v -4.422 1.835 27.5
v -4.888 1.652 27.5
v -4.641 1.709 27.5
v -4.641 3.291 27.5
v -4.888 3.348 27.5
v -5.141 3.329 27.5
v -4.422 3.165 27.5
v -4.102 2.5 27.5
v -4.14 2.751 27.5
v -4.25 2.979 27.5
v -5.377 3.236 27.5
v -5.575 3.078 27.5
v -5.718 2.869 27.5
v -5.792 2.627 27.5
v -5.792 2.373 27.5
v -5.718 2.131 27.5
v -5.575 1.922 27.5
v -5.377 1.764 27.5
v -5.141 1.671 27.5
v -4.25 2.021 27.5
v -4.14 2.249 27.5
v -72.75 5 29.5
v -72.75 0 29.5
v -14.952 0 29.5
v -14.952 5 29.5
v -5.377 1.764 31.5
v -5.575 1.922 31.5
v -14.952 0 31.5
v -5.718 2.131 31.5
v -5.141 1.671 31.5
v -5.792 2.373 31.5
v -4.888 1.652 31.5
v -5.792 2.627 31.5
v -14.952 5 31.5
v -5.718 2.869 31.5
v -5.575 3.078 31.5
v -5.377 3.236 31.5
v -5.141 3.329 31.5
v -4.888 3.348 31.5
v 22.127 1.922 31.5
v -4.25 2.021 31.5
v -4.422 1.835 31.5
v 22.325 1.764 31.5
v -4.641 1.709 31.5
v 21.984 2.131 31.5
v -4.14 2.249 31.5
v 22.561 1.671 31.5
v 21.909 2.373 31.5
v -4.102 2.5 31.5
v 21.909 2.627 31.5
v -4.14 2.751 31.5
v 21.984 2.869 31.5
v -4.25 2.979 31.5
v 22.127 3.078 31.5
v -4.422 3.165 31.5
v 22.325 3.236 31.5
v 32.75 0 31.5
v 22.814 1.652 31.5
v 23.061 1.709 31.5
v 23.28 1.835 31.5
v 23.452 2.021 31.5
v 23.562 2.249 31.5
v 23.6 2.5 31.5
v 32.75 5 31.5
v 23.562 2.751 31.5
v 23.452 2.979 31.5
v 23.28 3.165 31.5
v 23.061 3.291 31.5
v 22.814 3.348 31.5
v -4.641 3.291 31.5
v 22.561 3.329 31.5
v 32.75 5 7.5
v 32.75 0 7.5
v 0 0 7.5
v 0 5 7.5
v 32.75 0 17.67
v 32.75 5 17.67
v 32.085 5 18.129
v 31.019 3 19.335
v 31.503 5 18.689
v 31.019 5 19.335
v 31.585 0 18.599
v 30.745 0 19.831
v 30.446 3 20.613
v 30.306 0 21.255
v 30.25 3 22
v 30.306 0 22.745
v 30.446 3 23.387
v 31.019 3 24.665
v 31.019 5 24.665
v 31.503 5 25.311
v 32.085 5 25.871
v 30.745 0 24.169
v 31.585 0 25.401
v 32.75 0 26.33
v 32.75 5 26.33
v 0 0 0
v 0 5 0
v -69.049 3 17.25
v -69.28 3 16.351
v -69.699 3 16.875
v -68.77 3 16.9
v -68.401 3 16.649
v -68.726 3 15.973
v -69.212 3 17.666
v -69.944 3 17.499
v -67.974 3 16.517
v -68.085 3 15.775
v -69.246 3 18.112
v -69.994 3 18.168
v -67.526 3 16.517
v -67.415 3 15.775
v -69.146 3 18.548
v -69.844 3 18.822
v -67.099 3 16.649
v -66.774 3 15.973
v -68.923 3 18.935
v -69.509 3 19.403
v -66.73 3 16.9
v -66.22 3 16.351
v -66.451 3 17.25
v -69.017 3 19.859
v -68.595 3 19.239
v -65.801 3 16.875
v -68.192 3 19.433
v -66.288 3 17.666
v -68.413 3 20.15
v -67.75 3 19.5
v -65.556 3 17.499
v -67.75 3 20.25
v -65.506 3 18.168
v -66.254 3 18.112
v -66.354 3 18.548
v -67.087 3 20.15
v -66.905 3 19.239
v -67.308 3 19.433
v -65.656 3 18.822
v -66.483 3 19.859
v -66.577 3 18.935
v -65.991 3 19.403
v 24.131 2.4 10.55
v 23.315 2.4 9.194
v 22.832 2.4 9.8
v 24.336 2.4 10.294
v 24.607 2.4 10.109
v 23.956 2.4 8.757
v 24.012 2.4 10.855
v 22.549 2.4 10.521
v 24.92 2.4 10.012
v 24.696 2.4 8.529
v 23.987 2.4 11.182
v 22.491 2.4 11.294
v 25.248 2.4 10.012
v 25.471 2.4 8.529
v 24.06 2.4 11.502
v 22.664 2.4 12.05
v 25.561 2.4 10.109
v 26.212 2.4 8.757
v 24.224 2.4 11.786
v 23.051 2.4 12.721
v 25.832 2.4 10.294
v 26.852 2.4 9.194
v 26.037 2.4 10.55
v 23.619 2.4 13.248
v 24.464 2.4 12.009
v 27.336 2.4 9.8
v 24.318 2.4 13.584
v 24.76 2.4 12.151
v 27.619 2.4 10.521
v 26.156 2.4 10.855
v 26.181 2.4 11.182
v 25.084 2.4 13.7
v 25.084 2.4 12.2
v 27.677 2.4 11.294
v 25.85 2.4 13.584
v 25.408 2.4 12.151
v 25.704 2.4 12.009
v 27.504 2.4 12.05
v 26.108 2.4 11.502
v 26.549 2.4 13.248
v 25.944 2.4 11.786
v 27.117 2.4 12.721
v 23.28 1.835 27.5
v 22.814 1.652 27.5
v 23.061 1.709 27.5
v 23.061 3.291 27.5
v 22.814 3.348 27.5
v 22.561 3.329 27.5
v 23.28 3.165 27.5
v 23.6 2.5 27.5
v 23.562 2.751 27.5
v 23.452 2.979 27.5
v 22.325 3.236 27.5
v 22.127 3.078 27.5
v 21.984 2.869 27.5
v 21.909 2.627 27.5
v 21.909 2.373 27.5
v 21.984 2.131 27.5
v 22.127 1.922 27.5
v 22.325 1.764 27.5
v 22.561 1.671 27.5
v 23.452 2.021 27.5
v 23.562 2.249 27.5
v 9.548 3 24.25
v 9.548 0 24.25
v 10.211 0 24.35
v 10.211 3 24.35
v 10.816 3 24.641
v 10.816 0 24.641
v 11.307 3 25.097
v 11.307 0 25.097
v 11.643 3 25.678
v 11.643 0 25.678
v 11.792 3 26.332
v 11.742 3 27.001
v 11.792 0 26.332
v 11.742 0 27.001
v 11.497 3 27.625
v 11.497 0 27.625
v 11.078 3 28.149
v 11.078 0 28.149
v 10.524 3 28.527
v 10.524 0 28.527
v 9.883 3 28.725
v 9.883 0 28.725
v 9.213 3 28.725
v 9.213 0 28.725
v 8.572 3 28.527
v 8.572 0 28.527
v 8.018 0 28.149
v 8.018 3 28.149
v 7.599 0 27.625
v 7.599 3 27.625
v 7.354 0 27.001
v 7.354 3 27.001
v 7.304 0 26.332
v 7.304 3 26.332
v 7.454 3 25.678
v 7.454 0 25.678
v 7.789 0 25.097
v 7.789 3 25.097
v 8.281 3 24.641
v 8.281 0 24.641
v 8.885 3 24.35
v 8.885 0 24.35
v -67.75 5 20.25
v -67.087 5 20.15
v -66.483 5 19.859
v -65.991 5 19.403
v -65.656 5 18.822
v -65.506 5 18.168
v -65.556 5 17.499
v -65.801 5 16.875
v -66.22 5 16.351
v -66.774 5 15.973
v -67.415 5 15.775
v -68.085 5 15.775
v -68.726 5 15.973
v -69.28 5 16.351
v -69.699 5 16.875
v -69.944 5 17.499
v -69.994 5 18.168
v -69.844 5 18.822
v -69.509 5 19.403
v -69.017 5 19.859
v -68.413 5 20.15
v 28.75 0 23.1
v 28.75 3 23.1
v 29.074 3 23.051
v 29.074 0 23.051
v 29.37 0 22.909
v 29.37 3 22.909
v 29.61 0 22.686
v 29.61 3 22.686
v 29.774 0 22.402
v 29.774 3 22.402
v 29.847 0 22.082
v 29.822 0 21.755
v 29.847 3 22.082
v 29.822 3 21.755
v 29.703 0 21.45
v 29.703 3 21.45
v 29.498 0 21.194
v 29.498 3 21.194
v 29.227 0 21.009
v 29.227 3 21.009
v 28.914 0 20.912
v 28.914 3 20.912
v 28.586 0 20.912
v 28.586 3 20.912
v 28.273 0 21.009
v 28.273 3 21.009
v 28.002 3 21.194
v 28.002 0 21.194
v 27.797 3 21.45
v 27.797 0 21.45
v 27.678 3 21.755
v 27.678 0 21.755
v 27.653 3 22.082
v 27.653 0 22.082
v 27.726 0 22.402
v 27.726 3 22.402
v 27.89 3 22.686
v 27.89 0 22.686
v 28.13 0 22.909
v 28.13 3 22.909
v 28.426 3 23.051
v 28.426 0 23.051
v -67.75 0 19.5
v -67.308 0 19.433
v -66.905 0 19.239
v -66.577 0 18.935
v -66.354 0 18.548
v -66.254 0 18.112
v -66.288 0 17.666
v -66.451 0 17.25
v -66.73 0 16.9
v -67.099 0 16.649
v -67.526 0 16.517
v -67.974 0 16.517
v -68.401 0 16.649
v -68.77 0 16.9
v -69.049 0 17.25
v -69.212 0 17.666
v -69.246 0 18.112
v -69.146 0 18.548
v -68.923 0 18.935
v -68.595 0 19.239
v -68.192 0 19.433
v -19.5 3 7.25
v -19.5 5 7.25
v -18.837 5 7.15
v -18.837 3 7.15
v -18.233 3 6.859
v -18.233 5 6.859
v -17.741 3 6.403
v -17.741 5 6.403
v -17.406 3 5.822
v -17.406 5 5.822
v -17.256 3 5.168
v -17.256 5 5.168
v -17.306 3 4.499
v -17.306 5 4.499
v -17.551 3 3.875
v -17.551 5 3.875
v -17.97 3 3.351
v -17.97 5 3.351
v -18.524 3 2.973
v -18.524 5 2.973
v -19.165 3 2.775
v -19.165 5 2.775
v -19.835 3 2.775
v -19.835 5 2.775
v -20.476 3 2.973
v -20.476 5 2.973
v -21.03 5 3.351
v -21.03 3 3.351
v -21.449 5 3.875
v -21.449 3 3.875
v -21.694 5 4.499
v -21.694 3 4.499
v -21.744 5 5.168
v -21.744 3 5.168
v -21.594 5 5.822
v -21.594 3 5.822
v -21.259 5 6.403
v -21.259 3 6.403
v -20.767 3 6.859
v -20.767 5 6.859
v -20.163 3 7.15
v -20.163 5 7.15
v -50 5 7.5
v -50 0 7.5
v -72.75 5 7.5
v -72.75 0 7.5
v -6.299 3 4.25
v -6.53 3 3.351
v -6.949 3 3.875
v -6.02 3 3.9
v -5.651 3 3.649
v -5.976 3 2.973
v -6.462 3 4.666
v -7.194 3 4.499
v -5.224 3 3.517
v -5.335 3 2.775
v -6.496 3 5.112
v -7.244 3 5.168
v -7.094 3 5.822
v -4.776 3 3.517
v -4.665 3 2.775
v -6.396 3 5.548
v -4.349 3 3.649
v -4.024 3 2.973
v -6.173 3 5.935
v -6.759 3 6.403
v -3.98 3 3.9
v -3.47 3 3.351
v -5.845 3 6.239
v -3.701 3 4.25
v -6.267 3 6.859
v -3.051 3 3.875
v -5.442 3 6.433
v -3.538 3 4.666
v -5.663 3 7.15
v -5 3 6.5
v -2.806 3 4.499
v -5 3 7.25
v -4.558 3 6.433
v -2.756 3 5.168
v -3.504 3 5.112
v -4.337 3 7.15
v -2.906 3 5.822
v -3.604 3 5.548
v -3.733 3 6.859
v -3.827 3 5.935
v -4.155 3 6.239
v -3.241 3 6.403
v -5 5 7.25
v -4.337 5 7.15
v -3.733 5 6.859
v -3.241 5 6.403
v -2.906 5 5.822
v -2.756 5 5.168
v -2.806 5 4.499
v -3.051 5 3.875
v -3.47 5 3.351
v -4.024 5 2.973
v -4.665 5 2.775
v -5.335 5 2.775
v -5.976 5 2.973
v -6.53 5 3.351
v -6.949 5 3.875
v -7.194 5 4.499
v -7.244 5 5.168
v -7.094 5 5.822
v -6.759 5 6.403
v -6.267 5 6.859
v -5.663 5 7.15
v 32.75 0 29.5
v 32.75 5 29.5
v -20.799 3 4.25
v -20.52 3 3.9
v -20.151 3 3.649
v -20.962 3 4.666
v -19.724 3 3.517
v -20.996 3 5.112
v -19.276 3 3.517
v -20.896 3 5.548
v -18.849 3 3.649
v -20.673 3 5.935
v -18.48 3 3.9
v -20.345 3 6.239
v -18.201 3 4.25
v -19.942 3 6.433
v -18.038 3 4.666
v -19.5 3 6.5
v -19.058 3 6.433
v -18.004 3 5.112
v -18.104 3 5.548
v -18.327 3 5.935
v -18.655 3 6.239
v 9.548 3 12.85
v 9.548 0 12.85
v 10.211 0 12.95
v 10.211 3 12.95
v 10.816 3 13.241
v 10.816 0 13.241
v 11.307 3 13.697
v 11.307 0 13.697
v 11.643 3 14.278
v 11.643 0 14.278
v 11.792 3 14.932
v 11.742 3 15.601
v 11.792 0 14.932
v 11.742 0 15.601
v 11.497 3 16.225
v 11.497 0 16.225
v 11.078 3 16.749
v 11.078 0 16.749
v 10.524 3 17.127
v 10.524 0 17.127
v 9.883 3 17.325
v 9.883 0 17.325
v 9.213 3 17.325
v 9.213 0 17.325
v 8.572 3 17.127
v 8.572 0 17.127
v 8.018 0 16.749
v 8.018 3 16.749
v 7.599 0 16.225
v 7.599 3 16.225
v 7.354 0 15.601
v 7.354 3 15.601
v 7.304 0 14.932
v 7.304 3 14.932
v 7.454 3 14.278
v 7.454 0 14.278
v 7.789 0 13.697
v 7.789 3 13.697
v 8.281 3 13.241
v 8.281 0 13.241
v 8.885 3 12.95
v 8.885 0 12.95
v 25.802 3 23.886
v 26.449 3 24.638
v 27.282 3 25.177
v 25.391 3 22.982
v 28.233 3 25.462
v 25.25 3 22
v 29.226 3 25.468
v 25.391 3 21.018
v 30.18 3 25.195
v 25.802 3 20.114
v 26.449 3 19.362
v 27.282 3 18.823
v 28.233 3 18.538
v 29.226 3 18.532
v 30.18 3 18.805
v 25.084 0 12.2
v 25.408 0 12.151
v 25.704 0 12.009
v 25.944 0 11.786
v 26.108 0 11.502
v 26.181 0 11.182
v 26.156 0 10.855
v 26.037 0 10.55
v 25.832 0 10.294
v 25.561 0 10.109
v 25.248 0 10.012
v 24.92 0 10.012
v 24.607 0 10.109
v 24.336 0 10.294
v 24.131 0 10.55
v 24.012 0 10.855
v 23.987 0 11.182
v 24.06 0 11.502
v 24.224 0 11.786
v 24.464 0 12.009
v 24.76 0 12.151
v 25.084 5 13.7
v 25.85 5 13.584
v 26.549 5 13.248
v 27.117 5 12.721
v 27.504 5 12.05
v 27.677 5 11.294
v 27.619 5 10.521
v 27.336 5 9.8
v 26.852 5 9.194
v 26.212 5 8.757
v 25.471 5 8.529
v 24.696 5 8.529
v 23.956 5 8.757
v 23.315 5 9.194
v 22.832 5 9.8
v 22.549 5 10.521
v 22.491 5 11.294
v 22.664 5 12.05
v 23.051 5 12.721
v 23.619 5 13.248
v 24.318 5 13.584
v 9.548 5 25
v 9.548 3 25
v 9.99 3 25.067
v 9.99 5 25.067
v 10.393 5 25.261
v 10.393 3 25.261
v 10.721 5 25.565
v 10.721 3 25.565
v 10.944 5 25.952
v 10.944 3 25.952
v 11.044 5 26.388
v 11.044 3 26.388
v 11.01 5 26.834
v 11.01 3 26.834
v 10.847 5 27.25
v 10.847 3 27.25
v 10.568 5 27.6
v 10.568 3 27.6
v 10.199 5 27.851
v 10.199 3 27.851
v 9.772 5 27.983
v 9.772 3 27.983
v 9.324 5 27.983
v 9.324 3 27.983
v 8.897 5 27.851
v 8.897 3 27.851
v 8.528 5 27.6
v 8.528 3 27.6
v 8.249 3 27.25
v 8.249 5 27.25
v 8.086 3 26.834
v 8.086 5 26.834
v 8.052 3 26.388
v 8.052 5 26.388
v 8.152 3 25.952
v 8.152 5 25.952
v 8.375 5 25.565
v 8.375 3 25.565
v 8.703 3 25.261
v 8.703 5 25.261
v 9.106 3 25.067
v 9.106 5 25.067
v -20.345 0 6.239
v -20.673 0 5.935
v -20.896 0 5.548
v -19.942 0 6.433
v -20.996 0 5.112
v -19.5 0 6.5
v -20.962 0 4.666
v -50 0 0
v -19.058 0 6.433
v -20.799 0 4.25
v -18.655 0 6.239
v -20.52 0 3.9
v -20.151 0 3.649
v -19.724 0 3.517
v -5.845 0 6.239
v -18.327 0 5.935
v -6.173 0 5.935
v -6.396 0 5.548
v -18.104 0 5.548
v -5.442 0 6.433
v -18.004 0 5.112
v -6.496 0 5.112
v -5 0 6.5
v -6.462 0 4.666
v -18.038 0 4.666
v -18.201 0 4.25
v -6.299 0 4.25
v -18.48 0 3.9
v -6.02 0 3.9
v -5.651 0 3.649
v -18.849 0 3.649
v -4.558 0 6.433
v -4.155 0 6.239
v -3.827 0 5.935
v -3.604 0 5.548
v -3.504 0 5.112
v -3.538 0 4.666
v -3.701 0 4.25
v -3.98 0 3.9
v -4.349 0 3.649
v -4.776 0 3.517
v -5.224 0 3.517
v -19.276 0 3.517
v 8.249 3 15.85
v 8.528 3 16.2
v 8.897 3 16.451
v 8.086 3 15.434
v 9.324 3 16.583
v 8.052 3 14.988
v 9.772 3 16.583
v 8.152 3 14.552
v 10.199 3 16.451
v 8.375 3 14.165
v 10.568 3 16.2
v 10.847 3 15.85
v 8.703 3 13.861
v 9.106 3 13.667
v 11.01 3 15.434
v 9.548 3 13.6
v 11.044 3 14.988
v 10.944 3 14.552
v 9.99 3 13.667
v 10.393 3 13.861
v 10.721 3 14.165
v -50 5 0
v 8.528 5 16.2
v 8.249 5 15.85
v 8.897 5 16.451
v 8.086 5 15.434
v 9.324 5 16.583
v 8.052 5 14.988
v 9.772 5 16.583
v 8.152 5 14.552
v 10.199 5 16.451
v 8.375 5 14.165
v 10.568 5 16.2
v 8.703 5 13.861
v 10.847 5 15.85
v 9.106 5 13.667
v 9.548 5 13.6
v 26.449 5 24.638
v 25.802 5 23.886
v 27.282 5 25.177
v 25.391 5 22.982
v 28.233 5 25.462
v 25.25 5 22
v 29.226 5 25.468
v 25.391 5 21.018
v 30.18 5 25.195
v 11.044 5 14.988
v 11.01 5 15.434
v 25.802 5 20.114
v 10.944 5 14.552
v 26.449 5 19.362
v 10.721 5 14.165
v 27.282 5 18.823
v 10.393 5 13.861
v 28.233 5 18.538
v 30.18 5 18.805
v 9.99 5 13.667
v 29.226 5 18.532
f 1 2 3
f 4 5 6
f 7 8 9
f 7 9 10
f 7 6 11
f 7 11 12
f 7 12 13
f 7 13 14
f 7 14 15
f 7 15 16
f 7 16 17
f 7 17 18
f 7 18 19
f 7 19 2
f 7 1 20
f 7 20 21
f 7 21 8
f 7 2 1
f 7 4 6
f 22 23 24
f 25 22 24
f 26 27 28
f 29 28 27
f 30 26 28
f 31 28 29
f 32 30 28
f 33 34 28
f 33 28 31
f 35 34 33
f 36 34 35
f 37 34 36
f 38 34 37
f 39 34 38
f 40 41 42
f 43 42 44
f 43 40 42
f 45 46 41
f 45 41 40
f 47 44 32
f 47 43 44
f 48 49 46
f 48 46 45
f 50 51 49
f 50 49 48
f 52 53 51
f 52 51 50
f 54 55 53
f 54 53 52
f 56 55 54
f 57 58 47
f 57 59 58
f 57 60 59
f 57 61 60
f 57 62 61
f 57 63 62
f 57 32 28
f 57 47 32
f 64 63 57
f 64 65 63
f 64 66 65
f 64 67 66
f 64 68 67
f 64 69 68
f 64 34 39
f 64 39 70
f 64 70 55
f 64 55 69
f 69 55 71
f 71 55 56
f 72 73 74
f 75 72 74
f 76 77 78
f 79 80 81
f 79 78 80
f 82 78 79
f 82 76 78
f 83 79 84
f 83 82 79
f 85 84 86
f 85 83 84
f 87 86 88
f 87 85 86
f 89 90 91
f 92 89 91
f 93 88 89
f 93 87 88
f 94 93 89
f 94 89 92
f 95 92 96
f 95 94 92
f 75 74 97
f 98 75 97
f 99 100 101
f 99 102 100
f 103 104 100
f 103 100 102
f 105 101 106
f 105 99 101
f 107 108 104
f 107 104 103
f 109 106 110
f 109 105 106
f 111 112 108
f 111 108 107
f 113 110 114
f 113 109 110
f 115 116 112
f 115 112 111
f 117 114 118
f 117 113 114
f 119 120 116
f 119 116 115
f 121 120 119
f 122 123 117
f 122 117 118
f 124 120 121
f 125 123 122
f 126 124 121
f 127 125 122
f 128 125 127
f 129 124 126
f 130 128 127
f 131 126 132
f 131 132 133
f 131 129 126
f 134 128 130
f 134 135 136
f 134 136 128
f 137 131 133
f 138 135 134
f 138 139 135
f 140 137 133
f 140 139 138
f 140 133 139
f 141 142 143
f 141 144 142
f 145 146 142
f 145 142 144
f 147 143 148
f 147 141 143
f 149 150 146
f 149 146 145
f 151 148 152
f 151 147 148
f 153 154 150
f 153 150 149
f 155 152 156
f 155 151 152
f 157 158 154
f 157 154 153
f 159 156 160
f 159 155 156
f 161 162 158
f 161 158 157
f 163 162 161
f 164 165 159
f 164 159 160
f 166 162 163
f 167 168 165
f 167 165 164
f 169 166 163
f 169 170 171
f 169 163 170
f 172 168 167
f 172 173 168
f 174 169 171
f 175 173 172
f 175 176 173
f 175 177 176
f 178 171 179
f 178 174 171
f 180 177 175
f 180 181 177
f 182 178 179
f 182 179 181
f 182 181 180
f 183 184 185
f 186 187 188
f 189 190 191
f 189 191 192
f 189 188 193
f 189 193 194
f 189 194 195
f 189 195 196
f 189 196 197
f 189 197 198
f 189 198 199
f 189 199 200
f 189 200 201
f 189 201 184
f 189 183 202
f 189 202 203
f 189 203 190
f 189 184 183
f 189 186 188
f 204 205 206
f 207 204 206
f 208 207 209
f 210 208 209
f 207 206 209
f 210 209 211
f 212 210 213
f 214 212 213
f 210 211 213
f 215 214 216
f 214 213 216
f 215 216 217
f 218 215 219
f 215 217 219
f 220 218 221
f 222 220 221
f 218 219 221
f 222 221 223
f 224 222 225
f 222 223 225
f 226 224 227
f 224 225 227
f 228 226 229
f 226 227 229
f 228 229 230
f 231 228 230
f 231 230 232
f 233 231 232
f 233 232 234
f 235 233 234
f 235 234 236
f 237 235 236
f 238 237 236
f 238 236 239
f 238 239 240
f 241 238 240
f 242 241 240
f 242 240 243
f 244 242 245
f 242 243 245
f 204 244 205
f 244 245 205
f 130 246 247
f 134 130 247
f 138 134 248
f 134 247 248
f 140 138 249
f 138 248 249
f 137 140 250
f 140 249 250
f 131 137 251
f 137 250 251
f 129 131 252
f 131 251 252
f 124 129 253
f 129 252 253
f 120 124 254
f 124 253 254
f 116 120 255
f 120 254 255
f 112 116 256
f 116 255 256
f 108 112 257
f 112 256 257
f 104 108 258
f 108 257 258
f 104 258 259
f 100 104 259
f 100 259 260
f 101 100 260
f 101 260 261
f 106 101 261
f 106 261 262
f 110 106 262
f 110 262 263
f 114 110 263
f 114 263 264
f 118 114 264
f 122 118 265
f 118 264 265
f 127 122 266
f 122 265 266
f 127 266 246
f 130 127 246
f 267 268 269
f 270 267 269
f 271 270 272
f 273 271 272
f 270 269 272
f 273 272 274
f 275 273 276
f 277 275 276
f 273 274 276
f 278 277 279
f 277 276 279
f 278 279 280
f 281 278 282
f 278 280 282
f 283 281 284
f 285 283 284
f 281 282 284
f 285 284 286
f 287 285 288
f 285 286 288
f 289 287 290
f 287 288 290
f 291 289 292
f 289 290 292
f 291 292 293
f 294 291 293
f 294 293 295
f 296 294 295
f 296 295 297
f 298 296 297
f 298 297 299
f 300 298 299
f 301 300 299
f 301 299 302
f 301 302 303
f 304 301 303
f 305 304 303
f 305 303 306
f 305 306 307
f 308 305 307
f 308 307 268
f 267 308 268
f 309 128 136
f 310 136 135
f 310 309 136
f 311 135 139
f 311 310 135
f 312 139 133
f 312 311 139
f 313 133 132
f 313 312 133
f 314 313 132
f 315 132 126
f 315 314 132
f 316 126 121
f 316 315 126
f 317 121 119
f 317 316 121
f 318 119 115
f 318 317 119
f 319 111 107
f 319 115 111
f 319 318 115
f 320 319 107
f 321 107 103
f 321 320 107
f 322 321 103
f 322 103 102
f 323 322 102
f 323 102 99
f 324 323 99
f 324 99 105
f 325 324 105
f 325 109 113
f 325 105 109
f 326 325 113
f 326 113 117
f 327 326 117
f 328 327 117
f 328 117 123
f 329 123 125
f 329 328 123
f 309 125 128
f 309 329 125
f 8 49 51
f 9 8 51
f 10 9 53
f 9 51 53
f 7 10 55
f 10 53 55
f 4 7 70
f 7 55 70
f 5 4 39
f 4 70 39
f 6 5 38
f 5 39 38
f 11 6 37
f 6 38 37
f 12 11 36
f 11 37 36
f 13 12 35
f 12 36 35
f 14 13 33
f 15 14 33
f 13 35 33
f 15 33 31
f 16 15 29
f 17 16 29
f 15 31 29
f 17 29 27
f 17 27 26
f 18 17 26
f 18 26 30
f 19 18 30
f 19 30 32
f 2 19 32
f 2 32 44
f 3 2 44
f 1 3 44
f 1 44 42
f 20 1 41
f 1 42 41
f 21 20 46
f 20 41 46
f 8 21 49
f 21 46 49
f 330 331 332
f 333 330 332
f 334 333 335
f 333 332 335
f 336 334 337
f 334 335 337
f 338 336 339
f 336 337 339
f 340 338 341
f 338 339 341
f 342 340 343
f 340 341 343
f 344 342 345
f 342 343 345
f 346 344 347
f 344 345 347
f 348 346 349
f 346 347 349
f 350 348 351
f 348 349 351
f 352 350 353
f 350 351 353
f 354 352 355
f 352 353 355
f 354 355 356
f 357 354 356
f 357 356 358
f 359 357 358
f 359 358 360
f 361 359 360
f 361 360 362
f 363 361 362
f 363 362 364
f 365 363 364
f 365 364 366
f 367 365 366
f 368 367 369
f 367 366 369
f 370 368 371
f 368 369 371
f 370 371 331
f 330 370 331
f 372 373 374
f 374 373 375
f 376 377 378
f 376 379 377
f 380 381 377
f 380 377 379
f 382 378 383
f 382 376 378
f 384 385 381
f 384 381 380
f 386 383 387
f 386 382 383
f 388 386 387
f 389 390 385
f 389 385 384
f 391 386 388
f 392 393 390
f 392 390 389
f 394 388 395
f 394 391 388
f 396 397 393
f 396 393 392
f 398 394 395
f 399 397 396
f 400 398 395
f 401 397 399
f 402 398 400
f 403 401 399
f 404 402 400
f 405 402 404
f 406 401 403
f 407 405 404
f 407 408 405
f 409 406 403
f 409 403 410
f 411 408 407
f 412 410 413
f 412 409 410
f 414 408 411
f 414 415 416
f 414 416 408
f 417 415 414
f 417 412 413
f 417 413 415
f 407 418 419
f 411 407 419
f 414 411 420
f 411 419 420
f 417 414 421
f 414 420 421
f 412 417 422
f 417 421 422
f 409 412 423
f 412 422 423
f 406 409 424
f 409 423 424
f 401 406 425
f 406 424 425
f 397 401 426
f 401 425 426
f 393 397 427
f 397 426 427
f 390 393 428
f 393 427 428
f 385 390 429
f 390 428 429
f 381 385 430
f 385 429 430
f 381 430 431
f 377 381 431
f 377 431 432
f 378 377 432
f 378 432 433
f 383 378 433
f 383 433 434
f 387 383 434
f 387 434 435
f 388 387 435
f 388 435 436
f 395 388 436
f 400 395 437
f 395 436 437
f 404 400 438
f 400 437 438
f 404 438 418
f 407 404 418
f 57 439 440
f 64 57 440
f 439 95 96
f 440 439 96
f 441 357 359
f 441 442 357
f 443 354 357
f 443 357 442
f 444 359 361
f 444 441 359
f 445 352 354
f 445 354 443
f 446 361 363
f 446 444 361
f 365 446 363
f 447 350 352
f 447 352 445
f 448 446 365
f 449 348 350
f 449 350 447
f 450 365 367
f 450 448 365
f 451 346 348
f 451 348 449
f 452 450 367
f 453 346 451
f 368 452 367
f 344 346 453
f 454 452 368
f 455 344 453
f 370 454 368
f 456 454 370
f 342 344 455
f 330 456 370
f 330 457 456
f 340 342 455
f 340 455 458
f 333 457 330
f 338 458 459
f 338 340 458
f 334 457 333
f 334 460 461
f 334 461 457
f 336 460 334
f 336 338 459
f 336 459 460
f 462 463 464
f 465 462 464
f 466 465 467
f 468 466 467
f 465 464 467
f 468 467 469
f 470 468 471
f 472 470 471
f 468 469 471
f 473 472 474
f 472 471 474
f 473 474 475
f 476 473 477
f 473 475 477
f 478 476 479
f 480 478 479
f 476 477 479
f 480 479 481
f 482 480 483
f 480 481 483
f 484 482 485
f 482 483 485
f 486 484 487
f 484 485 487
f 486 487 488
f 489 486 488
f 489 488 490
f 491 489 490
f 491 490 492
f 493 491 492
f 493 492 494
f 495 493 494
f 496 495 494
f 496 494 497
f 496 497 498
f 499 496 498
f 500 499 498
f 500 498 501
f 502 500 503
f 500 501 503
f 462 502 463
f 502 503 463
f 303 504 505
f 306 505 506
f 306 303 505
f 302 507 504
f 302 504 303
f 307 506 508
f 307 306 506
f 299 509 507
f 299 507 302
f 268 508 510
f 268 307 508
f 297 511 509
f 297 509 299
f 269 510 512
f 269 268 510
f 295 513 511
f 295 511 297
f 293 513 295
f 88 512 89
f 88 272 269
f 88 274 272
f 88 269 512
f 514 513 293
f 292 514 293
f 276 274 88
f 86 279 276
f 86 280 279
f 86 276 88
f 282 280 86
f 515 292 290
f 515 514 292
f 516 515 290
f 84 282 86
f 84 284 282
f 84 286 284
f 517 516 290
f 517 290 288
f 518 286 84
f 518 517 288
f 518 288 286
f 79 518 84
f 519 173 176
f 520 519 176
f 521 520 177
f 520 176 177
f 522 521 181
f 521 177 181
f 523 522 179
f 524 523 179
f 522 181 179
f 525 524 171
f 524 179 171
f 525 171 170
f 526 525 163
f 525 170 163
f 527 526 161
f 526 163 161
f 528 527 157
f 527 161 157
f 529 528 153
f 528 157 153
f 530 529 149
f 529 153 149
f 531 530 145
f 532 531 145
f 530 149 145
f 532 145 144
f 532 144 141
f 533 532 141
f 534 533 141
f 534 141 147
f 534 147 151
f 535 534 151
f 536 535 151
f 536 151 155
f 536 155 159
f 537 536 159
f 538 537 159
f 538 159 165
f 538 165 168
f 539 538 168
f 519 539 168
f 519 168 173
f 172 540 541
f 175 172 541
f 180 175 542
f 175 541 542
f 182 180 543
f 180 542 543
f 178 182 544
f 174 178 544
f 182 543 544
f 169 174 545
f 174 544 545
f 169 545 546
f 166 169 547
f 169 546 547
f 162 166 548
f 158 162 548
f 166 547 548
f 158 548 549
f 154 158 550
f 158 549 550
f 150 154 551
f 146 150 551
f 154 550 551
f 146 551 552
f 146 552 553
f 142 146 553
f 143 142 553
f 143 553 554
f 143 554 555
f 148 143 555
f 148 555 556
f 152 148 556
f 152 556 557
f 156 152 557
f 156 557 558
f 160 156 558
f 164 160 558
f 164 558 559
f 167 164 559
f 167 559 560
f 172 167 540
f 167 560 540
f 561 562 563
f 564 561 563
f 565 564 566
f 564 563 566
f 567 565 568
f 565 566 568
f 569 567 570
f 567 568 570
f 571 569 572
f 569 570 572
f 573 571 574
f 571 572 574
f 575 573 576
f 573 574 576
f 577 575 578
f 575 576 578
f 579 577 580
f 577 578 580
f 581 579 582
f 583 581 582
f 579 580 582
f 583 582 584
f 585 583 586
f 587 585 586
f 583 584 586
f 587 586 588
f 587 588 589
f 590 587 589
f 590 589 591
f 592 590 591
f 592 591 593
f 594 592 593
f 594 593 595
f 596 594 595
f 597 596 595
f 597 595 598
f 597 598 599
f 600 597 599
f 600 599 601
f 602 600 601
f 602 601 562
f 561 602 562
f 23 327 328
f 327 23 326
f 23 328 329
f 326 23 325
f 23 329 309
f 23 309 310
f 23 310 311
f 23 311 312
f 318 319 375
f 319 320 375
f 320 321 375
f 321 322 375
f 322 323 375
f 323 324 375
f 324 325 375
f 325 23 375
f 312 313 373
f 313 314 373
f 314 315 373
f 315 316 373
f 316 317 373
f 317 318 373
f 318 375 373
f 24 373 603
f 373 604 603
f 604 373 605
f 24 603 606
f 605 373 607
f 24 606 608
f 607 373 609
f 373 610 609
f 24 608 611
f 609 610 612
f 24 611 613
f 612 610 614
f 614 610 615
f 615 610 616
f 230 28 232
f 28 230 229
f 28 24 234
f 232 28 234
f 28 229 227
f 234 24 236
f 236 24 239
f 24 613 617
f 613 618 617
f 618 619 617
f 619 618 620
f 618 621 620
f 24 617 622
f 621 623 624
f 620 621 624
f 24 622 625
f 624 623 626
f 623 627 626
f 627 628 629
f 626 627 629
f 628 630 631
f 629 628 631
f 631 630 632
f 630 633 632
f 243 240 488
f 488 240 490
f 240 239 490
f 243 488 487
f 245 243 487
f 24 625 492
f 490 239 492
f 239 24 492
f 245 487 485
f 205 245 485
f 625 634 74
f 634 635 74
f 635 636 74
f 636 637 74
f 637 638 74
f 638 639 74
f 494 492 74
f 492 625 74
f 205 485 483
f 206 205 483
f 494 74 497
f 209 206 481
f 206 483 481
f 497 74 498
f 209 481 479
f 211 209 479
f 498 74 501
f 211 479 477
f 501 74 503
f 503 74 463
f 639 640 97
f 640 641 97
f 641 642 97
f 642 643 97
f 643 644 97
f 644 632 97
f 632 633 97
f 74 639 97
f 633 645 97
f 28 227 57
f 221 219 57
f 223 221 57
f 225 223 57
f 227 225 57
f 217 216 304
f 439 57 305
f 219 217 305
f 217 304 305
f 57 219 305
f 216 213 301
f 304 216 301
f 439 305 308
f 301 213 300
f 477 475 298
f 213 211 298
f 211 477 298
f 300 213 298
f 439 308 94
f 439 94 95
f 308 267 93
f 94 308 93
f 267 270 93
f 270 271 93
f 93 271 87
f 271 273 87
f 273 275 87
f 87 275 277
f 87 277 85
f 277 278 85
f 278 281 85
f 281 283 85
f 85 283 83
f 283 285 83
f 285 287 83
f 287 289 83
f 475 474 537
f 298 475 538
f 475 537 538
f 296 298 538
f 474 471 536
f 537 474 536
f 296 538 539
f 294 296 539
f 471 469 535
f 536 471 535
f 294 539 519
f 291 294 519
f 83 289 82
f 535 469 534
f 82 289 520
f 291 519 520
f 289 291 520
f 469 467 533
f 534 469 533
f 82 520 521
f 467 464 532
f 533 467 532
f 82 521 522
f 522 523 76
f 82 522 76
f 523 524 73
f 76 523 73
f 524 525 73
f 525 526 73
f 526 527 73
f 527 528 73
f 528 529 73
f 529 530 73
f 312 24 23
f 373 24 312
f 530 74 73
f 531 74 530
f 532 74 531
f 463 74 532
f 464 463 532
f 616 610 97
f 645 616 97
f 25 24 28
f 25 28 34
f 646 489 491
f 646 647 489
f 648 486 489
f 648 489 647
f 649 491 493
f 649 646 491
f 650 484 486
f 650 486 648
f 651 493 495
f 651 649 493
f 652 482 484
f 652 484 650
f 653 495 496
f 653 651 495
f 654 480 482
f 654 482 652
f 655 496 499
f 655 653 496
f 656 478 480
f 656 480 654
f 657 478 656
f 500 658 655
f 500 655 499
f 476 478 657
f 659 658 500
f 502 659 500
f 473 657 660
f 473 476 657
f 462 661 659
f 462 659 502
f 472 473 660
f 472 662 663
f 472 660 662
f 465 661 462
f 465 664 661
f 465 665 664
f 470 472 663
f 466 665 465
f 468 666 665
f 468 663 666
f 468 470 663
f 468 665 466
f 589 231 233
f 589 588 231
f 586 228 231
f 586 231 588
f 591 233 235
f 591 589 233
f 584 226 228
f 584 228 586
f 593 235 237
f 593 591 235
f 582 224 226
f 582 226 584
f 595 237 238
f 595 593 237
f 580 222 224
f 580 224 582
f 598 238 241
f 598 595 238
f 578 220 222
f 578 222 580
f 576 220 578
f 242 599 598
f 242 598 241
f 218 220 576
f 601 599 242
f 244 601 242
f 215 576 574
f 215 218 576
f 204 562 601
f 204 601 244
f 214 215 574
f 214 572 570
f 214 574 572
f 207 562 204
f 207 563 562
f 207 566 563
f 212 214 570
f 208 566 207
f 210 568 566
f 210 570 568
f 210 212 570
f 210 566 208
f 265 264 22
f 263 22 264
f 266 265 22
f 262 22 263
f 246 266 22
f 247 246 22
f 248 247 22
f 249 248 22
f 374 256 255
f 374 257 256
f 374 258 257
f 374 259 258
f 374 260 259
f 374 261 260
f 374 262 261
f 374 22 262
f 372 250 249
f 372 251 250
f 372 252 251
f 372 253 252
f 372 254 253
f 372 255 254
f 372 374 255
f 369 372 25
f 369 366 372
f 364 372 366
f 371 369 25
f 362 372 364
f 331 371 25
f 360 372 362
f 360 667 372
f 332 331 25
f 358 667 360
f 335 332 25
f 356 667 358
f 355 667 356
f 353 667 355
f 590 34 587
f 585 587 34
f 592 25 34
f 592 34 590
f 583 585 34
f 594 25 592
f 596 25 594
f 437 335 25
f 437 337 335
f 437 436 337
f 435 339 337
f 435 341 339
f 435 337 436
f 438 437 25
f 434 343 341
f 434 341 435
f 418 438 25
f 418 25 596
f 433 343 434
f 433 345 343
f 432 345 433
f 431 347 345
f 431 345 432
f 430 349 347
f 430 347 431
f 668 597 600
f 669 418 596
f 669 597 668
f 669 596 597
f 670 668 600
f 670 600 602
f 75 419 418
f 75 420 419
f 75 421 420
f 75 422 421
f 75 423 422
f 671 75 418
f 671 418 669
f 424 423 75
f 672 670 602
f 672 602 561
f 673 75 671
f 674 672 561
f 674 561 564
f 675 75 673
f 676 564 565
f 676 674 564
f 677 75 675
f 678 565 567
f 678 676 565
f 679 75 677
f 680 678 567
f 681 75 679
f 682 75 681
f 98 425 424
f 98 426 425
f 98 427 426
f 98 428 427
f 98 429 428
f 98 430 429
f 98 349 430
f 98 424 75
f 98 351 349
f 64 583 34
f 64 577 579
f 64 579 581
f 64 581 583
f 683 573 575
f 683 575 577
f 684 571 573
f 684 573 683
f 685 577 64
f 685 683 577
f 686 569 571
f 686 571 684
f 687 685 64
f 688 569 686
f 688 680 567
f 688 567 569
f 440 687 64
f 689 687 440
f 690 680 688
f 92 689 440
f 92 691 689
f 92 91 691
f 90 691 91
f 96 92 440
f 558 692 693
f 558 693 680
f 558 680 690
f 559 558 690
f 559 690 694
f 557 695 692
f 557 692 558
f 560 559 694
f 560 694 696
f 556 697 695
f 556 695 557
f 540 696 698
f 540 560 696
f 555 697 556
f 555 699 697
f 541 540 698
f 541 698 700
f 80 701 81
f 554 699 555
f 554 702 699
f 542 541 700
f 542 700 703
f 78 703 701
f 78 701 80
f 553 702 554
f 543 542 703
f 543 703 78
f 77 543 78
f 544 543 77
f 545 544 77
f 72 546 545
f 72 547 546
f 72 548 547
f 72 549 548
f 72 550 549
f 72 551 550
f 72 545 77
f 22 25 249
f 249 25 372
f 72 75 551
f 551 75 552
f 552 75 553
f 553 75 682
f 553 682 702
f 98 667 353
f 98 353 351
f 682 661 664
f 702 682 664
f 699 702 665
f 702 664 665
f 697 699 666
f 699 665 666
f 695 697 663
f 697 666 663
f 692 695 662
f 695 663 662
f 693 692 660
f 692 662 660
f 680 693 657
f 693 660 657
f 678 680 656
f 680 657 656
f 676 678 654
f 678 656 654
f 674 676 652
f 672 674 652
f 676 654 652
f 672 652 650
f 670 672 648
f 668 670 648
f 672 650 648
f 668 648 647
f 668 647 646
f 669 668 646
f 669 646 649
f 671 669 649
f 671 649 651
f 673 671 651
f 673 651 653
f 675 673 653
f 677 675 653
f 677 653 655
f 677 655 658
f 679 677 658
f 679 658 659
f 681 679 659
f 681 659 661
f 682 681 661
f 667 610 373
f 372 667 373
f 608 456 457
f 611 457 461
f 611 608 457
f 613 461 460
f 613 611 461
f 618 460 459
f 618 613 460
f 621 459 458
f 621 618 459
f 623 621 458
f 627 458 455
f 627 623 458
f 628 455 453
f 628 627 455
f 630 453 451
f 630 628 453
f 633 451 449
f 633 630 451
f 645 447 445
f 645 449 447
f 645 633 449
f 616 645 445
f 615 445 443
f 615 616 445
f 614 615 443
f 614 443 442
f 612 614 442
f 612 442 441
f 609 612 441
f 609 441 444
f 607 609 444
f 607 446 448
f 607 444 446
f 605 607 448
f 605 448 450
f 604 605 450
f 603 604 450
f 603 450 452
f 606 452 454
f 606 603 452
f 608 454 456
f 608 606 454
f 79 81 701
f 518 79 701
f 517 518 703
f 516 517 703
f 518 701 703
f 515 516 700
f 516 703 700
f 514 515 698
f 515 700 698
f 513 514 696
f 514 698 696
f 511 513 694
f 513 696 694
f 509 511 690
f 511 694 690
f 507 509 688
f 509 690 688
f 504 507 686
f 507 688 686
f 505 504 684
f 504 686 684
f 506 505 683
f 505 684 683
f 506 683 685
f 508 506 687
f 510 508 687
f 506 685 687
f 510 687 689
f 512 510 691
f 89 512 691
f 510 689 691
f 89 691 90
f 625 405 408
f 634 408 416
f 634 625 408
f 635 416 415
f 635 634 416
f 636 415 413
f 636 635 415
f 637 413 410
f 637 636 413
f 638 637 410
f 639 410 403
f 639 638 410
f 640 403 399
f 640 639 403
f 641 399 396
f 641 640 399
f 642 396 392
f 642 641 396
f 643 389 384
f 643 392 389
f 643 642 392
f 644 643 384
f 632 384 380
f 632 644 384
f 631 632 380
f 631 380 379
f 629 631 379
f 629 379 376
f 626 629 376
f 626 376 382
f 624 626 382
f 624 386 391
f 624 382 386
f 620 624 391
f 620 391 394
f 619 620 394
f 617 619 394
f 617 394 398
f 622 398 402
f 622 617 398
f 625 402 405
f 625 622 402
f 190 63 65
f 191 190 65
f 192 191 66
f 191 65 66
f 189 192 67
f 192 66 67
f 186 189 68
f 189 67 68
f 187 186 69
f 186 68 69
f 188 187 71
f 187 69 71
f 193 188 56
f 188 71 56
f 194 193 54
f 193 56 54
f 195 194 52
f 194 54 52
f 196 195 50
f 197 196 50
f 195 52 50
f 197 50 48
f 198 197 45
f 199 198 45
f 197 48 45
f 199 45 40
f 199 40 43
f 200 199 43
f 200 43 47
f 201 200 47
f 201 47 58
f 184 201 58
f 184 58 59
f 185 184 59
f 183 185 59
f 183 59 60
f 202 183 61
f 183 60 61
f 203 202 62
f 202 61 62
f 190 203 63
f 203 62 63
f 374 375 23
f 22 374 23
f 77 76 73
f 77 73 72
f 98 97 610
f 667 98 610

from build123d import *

# Parameters (mm, degrees)
EXTRUDE_1_DEPTH      = 5
SKETCH_1_20_R        = 1.5
CUT_EXTRUDE_2_DEPTH  = 79.662649968
CUT_EXTRUDE_START    = 5
SKETCH_1_22_R        = 2.25
CUT_EXTRUDE_3_DEPTH  = 2
SKETCH_1_23_R        = 2.6
CUT_EXTRUDE_4_DEPTH  = 2.6
SKETCH_1_24_R        = 1.1
CUT_EXTRUDE_6_DEPTH  = 84.662649968
SKETCH_4_R           = 1.5
CUT_EXTRUDE_7_DEPTH  = 79.662649968
SKETCH_4_3_R         = 2.25
CUT_EXTRUDE_8_DEPTH  = 3
SKETCH_5_W           = 47.701964887
SKETCH_5_H           = 5
EXTRUDE_2_DEPTH      = 2
SKETCH_6_R           = 0.85
CUT_EXTRUDE_9_DEPTH  = 4
SKETCH_1_25_R        = 5
CUT_EXTRUDE_12_DEPTH = 80.434328221
SKETCH_1_26_R        = 3.5
CUT_EXTRUDE_13_DEPTH = 2


with BuildPart() as part:
    # 草图1 → 凸台-拉伸1 (new body)
    with BuildSketch(Plane(origin=(0, 0, 0), x_dir=(1, 0, 0), z_dir=(0, 1, 0))):
        Polygon((-72.75, -7.5), (-72.75, -29.5), (32.75, -29.5), (32.75, -7.5), (0, -7.5), (0, 0), (-50, 0), (-50, -7.5), align=None)
    extrude(amount=EXTRUDE_1_DEPTH)

    # 草图1<20> → 切除-拉伸2 (cut, through all)
    with BuildSketch(Plane(origin=(0, 0, 0), x_dir=(1, 0, 0), z_dir=(0, 1, 0))):
        with Locations(Location((-19.5, -5, 0), (0, 0, 270))):
            Circle(SKETCH_1_20_R)
        with Locations(Location((-5, -5, 0), (0, 0, 270))):
            Circle(SKETCH_1_20_R)
        with Locations(Location((-67.75, -18, 0), (0, 0, 270))):
            Circle(SKETCH_1_20_R)
    extrude(amount=CUT_EXTRUDE_2_DEPTH, mode=Mode.SUBTRACT)

    # 草图1<22> → 切除-拉伸3 (cut)
    with BuildSketch(Plane(origin=(0, 0, 0), x_dir=(1, 0, 0), z_dir=(0, 1, 0)).offset(CUT_EXTRUDE_START)):
        with Locations(Location((-19.5, -5, 0), (0, 0, 270))):
            Circle(SKETCH_1_22_R)
        with Locations(Location((-5, -5, 0), (0, 0, 270))):
            Circle(SKETCH_1_22_R)
        with Locations(Location((-67.75, -18, 0), (0, 0, 270))):
            Circle(SKETCH_1_22_R)
    extrude(amount=-CUT_EXTRUDE_3_DEPTH, mode=Mode.SUBTRACT)

    # 草图1<23> → 切除-拉伸4 (cut)
    with BuildSketch(Plane(origin=(0, 0, 0), x_dir=(1, 0, 0), z_dir=(0, 1, 0)).offset(CUT_EXTRUDE_START)):
        with Locations(Location((25.083939444, -11.1, 0), (0, 0, 270))):
            Circle(SKETCH_1_23_R)
    extrude(amount=-CUT_EXTRUDE_4_DEPTH, mode=Mode.SUBTRACT)

    # 草图1<24> → 切除-拉伸6 (cut, through all)
    with BuildSketch(Plane(origin=(0, 0, 0), x_dir=(1, 0, 0), z_dir=(0, 1, 0)).offset(CUT_EXTRUDE_START)):
        with Locations(Location((28.75, -22, 0), (0, 0, 270))):
            Circle(SKETCH_1_24_R)
        with Locations(Location((25.083939444, -11.1, 0), (0, 0, 270))):
            Circle(SKETCH_1_24_R)
    extrude(amount=-CUT_EXTRUDE_6_DEPTH, mode=Mode.SUBTRACT)

    # 草图4 → 切除-拉伸7 (cut, through all)
    with BuildSketch(Plane.XZ):
        with Locations(Location((9.548035113, 15.1, 0), (0, 0, 270))):
            Circle(SKETCH_4_R)
        with Locations(Location((9.548035113, 26.5, 0), (0, 0, 270))):
            Circle(SKETCH_4_R)
    extrude(amount=-CUT_EXTRUDE_7_DEPTH, mode=Mode.SUBTRACT)

    # 草图4<3> → 切除-拉伸8 (cut)
    with BuildSketch(Plane.XZ):
        with Locations(Location((9.548035113, 15.1, 0), (0, 0, 270))):
            Circle(SKETCH_4_3_R)
        with Locations(Location((9.548035113, 26.5, 0), (0, 0, 270))):
            Circle(SKETCH_4_3_R)
    extrude(amount=-CUT_EXTRUDE_8_DEPTH, mode=Mode.SUBTRACT)

    # 草图5 → 凸台-拉伸2 (add)
    with BuildSketch(Plane.XY.offset(29.5)):
        with Locations((8.899017556, 2.5)):
            Rectangle(SKETCH_5_W, SKETCH_5_H)
    extrude(amount=EXTRUDE_2_DEPTH)

    # 草图6 → 切除-拉伸9 (cut)
    with BuildSketch(Plane.XY.offset(31.5)):
        with Locations((22.75, 2.5)):
            Circle(SKETCH_6_R)
        with Locations((-4.951964887, 2.5)):
            Circle(SKETCH_6_R)
    extrude(amount=-CUT_EXTRUDE_9_DEPTH, mode=Mode.SUBTRACT)

    # 草图1<25> → 切除-拉伸12 (cut, through all)
    with BuildSketch(Plane(origin=(0, 0, 0), x_dir=(1, 0, 0), z_dir=(0, 1, 0))):
        with Locations((35.25, -22)):
            Circle(SKETCH_1_25_R)
    extrude(amount=CUT_EXTRUDE_12_DEPTH, mode=Mode.SUBTRACT)

    # 草图1<26> → 切除-拉伸13 (cut)
    with BuildSketch(Plane(origin=(0, 0, 0), x_dir=(1, 0, 0), z_dir=(0, 1, 0)).offset(CUT_EXTRUDE_START)):
        with Locations((28.75, -22)):
            Circle(SKETCH_1_26_R)
    extrude(amount=-CUT_EXTRUDE_13_DEPTH, mode=Mode.SUBTRACT)


solid = part.part
